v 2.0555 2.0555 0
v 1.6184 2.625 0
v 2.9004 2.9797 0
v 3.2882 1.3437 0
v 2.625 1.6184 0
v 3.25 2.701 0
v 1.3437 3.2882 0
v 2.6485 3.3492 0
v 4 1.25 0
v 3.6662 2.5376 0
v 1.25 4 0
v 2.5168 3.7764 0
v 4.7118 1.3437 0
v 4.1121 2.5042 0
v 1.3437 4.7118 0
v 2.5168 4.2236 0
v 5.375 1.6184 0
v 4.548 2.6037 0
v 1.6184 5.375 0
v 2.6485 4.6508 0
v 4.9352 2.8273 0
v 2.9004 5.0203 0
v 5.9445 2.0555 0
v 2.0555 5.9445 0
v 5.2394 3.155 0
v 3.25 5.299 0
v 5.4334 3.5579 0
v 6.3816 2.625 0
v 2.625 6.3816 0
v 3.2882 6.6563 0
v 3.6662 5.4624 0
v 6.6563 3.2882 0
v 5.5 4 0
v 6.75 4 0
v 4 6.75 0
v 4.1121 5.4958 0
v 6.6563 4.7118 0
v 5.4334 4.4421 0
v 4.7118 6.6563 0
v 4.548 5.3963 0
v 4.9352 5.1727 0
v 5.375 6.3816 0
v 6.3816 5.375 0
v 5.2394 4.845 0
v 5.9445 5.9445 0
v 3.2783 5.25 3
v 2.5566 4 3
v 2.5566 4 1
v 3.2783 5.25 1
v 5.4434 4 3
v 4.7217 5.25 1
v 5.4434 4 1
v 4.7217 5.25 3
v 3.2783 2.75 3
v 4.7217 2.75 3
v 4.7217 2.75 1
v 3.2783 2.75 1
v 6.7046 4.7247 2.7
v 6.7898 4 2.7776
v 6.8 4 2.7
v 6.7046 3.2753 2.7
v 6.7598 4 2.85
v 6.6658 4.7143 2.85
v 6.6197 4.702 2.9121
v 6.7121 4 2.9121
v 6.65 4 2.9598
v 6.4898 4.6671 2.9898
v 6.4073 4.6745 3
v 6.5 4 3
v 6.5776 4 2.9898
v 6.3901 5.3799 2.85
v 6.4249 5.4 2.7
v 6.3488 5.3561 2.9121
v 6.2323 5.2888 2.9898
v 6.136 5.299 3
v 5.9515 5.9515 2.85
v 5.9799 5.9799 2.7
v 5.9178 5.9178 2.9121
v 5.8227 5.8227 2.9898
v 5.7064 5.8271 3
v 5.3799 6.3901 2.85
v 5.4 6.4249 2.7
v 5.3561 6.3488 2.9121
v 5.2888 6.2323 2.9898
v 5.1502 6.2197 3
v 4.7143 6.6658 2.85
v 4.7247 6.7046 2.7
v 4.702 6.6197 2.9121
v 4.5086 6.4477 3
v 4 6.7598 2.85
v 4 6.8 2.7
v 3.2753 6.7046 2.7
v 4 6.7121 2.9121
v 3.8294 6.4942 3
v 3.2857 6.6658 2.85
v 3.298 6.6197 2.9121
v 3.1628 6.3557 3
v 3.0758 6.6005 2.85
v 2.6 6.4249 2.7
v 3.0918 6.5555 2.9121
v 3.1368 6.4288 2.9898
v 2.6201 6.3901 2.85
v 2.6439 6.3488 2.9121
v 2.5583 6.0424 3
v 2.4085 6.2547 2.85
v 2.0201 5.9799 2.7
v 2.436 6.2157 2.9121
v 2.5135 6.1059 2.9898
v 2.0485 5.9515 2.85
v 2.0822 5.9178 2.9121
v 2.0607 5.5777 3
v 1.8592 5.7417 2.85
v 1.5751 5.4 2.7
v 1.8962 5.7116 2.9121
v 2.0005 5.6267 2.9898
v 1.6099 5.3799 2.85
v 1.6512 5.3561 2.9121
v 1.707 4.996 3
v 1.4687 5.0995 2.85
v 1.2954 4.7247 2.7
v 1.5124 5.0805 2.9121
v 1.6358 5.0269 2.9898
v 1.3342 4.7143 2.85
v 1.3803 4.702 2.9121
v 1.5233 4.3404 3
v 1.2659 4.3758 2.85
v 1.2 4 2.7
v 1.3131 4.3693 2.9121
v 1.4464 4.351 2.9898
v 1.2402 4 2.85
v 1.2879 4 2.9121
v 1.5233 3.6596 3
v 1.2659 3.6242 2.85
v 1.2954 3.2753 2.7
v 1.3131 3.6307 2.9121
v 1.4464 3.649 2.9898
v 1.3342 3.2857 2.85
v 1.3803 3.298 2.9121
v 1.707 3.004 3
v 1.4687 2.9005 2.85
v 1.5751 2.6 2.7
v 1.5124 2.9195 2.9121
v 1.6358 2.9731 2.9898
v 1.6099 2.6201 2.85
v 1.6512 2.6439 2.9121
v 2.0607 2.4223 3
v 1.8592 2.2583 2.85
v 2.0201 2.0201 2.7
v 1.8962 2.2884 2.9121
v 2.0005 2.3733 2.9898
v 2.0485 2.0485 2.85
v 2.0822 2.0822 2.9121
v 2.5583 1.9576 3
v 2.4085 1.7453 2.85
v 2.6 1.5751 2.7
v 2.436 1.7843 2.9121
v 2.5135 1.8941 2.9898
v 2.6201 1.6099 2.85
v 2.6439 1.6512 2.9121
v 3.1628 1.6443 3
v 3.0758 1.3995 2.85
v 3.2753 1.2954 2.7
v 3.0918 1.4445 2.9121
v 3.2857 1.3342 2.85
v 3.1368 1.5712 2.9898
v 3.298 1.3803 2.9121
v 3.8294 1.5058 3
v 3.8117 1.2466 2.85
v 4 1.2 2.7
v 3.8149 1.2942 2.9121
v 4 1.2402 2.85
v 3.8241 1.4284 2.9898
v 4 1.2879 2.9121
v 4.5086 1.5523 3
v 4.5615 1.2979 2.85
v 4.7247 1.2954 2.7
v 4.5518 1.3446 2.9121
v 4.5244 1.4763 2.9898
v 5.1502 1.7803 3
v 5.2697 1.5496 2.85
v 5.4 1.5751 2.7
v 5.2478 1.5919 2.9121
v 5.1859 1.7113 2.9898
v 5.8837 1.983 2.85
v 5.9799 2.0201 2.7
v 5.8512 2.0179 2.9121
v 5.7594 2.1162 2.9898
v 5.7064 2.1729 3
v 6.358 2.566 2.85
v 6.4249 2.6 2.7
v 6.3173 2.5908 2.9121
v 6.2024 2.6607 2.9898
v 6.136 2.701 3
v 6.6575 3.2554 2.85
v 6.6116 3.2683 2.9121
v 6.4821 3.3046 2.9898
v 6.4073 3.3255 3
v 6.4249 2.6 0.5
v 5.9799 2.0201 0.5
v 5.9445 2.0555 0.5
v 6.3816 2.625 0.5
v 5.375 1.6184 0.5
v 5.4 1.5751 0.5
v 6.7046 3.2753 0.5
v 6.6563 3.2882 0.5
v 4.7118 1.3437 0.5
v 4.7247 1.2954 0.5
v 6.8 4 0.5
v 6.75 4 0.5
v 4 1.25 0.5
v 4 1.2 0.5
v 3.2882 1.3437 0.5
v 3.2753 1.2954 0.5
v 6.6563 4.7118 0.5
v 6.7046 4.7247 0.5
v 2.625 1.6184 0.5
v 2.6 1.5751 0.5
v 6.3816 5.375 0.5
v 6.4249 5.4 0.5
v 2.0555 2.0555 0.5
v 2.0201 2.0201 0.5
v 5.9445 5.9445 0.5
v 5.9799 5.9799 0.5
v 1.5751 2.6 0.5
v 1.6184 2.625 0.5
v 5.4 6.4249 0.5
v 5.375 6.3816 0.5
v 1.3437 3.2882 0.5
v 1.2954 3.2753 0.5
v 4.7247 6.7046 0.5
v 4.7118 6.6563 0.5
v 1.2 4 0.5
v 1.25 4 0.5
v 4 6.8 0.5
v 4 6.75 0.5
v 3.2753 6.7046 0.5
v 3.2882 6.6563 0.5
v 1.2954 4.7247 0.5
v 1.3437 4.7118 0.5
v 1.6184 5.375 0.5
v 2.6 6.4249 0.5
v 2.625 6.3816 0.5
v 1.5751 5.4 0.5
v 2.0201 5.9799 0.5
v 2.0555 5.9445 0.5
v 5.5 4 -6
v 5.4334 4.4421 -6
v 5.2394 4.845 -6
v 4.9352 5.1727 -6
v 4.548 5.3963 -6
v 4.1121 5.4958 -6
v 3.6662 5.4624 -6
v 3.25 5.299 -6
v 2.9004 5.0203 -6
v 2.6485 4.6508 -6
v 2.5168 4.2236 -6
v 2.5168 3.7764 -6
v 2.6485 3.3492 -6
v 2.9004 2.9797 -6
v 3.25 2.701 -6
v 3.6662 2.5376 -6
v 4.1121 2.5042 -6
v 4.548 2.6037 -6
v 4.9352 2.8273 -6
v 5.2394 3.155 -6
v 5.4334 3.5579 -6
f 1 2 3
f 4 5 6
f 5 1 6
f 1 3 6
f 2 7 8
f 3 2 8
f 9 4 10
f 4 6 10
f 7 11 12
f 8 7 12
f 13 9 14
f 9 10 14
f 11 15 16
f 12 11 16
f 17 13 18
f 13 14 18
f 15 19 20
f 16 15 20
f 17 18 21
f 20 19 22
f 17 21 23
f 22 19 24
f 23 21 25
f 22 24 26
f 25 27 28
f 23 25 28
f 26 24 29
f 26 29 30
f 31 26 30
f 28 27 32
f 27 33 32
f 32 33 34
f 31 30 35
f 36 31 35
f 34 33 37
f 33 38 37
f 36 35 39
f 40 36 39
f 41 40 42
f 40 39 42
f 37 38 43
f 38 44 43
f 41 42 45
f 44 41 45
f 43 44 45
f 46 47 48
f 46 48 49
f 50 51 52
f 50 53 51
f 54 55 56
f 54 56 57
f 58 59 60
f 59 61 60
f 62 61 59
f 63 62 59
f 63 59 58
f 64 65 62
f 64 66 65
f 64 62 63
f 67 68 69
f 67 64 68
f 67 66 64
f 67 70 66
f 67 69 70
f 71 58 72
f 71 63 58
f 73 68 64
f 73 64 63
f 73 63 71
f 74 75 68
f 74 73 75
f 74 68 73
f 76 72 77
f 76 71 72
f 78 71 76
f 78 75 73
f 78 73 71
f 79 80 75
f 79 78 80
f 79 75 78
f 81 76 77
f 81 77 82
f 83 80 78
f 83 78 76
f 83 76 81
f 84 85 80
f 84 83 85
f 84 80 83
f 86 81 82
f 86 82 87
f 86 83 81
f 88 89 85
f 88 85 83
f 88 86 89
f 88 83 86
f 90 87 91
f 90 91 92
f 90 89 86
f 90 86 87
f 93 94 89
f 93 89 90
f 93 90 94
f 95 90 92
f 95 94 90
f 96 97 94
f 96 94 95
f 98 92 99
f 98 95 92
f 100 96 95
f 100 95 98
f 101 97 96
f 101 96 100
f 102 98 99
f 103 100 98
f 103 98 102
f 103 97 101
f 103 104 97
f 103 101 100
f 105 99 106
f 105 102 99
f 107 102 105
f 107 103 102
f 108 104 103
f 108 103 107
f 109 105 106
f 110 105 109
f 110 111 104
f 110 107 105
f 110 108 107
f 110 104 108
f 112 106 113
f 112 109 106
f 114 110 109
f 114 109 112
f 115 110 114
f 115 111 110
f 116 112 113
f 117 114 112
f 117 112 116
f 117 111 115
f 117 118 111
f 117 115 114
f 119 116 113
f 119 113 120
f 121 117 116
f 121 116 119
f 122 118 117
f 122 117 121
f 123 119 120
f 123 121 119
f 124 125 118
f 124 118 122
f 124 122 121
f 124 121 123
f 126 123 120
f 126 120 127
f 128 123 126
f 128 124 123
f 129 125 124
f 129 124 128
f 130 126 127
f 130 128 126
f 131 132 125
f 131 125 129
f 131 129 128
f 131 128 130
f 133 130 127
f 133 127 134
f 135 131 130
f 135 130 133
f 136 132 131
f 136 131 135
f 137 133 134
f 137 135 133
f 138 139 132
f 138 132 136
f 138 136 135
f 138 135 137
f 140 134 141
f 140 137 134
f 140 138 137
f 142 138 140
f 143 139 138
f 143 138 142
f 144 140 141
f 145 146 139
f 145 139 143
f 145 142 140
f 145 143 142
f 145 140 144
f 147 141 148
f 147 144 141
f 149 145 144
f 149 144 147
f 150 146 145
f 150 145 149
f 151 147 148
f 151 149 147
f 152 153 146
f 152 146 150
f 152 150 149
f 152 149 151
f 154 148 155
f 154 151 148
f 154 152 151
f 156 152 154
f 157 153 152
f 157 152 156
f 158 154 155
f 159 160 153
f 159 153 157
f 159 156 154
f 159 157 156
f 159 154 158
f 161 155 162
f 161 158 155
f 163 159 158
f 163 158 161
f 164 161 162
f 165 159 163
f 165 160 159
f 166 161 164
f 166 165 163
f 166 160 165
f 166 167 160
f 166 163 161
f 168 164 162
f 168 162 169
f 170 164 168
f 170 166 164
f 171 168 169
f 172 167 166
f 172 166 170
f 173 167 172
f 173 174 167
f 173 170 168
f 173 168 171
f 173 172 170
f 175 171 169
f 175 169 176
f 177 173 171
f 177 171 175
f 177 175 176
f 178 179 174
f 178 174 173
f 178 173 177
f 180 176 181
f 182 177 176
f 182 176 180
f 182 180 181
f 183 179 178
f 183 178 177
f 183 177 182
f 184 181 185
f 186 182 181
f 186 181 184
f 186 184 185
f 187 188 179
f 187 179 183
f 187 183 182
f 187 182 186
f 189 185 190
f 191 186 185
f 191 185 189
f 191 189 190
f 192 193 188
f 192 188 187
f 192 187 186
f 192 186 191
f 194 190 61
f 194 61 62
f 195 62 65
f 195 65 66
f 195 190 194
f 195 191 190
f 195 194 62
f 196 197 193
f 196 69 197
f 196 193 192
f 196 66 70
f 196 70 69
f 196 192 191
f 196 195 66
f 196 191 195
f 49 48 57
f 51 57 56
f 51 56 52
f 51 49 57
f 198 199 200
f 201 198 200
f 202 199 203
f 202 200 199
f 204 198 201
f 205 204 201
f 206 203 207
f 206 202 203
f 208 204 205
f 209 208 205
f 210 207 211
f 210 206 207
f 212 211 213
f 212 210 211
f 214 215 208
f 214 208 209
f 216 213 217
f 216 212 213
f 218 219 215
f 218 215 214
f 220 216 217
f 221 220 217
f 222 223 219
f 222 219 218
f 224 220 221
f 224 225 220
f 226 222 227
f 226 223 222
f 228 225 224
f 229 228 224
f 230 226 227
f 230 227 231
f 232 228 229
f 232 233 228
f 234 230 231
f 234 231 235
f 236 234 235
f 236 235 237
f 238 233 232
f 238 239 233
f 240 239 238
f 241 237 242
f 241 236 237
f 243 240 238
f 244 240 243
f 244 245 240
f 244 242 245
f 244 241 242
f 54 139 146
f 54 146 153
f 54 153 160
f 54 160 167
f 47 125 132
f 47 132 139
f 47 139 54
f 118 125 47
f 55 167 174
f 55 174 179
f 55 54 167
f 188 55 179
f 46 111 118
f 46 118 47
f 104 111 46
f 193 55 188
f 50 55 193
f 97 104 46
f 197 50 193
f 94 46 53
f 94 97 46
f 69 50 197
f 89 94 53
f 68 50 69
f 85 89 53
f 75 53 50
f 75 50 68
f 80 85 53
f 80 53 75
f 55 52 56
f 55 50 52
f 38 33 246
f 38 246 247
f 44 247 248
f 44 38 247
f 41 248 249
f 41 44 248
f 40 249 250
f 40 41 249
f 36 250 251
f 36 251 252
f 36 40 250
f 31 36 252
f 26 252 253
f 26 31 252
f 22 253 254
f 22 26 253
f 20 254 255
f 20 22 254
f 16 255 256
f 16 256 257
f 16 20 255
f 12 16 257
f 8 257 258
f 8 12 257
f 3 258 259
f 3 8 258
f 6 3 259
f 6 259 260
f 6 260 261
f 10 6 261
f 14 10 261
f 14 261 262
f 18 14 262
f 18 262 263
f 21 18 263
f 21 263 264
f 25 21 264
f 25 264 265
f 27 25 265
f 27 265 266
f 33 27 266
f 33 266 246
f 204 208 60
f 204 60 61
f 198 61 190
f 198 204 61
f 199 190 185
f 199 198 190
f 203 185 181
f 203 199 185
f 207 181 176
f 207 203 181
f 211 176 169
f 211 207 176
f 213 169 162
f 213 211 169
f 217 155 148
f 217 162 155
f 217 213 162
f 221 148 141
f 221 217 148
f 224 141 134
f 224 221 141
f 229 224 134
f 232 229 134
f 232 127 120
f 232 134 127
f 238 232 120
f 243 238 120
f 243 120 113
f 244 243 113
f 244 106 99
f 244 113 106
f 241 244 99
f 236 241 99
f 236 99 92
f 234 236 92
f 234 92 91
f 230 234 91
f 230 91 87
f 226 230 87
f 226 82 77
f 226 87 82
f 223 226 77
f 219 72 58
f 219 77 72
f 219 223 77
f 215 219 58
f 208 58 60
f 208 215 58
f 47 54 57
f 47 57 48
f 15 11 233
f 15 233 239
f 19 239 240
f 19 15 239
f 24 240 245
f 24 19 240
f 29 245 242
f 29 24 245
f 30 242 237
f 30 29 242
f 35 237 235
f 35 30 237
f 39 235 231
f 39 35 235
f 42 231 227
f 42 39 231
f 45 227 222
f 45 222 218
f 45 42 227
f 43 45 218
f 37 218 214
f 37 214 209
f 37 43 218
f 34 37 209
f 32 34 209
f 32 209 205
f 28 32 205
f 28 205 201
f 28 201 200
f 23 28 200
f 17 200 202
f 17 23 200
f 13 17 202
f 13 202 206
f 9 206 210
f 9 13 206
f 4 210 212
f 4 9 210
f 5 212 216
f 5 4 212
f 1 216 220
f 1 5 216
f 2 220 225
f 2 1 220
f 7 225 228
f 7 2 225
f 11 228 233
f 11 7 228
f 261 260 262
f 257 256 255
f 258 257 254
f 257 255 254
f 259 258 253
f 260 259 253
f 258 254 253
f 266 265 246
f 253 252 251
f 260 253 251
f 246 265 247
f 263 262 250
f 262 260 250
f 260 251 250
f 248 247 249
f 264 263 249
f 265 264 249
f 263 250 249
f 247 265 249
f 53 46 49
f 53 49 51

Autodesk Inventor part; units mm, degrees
ref_plane "YZ Plane" through (0, 0, 0) normal (1, 0, 0) x (0, 1, 0)
ref_plane "XZ Plane" through (0, 0, 0) normal (0, 1, 0) x (-1, 0, 0)
ref_plane "XY Plane" through (0, 0, 0) normal (0, 0, 1) x (1, 0, 0)
sketch "Sketch1" plane through (0, 0, 0) normal (0, 0, 1) x (1, 0, 0)
  circle A0 centre (4, 4) radius 1.2 projected
  circle A1 centre (4, 4) radius 1.5
  point P0 (0, 0)
  dimension "d0" = 3
extrude "Extrusion1" add sketch "Sketch1" against normal blind 6 contours A0 | A1
sketch "Sketch2" plane through (4, 4, 0) normal (0, 0, 1) x (1, 0, 0)
  circle A0 centre (0, 0) radius 1.5 projected
  circle A1 centre (0, 0) radius 2.8
  point P0 (-4, -4)
  dimension "d3" = 5.6
extrude "Extrusion2" add sketch "Sketch2" along normal blind 3 contours A0 | A1
fillet "Fillet1" radius 0.3 1 edges at (1.2, 4, 3)
sketch "Sketch3" plane through (4, 4, 0) normal (0, 0, -1) x (-1, 0, 0)
  circle A0 centre (0, 0) radius 2.8 projected
  circle A1 centre (0, 0) radius 1.5 projected
  circle A2 centre (0, 0) radius 2.75
  point P0 (4, -4)
  dimension "d7" = 5.5
extrude "Extrusion3" cut sketch "Sketch3" against normal blind 0.5 contours A0
sketch "Sketch4" plane through (4, 4, 3) normal (0, 0, 1) x (1, 0, 0)
  circle A0 centre (0, 0) radius 2.5 projected
  line L0 (0.7217, 1.25) -> (1.4434, 0)
  line L1 (1.4434, 0) -> (0.7217, -1.25)
  line L2 (0.7217, -1.25) -> (-0.7217, -1.25)
  line L3 (-0.7217, -1.25) -> (-1.4434, 0)
  line L4 (-1.4434, 0) -> (-0.7217, 1.25)
  line L5 (-0.7217, 1.25) -> (0.7217, 1.25)
  point P0 (-4, -4)
  dimension "d10" = 2.5
extrude "Extrusion4" cut sketch "Sketch4" against normal blind 2 contours L0 L1 L2 L3 L4 L5
thread "Thread1" size "M3x0.5" class "6g" standard "ANSI Metric M Profile" full length
properties part number "m3 6" material "Steel"
